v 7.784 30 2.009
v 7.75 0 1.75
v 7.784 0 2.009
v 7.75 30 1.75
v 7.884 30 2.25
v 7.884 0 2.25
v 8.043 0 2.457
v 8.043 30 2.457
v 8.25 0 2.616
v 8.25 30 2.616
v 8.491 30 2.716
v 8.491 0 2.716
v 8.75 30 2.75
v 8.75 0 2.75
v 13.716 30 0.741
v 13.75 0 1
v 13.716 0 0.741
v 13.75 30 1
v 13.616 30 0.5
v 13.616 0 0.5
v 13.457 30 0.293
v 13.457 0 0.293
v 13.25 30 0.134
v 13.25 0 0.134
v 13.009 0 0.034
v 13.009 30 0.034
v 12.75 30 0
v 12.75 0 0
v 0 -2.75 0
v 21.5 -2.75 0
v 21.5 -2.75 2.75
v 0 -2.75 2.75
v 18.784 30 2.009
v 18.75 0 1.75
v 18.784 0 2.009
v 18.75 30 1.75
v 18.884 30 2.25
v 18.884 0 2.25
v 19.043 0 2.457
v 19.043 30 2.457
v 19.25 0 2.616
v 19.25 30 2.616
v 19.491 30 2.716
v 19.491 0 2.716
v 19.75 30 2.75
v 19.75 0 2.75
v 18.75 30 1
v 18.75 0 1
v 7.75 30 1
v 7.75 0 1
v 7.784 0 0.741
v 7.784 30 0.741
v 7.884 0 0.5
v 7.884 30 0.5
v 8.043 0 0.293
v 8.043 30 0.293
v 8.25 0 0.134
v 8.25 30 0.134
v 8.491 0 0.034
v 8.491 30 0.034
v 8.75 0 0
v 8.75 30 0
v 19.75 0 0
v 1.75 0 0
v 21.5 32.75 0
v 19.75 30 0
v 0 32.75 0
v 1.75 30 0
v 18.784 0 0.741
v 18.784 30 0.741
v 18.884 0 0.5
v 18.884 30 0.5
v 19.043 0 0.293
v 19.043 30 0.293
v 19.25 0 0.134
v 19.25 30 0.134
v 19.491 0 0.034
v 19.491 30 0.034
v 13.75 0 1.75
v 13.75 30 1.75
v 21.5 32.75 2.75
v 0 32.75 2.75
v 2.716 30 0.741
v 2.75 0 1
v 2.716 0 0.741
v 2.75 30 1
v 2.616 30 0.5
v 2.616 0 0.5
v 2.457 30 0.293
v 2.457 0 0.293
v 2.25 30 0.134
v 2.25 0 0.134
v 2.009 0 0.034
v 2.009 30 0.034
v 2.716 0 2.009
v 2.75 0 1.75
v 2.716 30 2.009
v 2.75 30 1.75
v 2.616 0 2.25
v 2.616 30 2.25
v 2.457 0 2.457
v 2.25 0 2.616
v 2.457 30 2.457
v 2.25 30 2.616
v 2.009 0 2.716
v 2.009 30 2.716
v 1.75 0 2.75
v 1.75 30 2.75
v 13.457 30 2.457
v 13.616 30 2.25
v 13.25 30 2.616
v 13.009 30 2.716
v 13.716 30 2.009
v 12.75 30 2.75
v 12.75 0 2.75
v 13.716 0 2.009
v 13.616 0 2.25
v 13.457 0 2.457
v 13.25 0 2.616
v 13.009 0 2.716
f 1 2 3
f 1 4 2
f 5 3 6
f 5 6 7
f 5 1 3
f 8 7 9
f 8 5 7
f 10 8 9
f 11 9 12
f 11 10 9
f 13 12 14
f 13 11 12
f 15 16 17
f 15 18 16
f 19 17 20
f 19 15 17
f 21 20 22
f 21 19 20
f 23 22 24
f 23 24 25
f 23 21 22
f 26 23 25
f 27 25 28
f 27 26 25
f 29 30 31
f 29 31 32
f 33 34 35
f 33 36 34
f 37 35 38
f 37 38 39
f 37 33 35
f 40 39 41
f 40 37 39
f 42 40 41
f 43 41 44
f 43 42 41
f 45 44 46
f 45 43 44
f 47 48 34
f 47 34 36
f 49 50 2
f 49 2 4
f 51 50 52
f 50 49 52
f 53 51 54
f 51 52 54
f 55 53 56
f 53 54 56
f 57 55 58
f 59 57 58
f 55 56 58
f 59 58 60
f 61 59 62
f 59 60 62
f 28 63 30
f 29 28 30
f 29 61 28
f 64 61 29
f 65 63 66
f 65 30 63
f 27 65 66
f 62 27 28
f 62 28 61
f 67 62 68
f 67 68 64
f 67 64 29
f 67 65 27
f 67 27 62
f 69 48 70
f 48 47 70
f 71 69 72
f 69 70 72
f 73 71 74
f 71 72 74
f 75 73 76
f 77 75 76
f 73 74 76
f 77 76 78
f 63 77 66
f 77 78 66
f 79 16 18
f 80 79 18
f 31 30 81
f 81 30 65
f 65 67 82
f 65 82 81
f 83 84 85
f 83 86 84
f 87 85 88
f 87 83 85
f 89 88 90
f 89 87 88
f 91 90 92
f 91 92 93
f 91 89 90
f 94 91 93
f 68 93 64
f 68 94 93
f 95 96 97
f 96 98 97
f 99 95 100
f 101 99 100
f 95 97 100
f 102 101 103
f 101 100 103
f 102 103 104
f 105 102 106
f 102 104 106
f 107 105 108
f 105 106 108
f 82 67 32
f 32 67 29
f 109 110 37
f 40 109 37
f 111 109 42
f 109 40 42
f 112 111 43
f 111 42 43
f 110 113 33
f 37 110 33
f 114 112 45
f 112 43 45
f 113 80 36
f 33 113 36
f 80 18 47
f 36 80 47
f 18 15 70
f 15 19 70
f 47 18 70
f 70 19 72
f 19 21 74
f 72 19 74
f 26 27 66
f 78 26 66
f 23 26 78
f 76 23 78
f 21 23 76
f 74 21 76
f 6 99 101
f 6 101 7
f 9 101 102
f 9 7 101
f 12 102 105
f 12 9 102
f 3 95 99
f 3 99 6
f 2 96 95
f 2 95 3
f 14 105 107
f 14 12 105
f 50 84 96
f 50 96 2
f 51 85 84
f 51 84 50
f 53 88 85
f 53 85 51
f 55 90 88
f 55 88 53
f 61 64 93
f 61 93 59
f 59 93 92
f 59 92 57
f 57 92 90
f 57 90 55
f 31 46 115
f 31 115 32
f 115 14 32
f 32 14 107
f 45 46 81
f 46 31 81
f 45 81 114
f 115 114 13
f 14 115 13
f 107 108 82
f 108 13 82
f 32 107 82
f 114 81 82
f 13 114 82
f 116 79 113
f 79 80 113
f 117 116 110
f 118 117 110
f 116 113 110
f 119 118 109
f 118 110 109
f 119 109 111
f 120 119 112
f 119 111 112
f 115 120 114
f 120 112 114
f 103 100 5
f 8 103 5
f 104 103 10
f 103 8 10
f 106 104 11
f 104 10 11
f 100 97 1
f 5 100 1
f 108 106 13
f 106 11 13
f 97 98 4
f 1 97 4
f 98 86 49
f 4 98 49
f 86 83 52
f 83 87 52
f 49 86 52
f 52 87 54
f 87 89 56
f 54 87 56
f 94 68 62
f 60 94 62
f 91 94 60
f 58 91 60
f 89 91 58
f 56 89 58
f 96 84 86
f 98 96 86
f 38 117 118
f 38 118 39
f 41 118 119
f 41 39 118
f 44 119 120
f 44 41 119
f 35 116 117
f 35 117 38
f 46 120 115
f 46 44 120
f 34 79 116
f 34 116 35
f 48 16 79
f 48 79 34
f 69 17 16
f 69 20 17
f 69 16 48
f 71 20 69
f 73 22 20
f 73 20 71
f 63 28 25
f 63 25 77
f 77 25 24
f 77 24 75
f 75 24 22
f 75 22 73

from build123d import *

# Parameters (mm, degrees)
SKETCH1_W           = 5
SKETCH1_H           = 30
BOSS_EXTRUDE1_DEPTH = 2.75
FILLET1_R           = 1


with BuildPart() as part:
    # Sketch1 → Boss-Extrude1 (new body)
    with BuildSketch(Plane.XY):
        Polygon((0, 30), (0, 32.75), (21.5, 32.75), (21.5, 30), (21.5, 0), (21.5, -2.75), (0, -2.75), (0, 0), align=None)
        with Locations((5.25, 15)):
            Rectangle(SKETCH1_W, SKETCH1_H, mode=Mode.SUBTRACT)
        with Locations((16.25, 15)):
            Rectangle(SKETCH1_W, SKETCH1_H, mode=Mode.SUBTRACT)
    extrude(amount=BOSS_EXTRUDE1_DEPTH)

    # Fillet1
    fillet1_edges = [part.edges().sort_by_distance(p)[0] for p in [
        (2.75, 15, 0),
        (7.75, 15, 0),
        (2.75, 15, 2.75),
        (7.75, 15, 2.75),
        (13.75, 15, 0),
        (18.75, 15, 0),
        (13.75, 15, 2.75),
        (18.75, 15, 2.75),
    ]]
    fillet(fillet1_edges, radius=FILLET1_R)


solid = part.part
